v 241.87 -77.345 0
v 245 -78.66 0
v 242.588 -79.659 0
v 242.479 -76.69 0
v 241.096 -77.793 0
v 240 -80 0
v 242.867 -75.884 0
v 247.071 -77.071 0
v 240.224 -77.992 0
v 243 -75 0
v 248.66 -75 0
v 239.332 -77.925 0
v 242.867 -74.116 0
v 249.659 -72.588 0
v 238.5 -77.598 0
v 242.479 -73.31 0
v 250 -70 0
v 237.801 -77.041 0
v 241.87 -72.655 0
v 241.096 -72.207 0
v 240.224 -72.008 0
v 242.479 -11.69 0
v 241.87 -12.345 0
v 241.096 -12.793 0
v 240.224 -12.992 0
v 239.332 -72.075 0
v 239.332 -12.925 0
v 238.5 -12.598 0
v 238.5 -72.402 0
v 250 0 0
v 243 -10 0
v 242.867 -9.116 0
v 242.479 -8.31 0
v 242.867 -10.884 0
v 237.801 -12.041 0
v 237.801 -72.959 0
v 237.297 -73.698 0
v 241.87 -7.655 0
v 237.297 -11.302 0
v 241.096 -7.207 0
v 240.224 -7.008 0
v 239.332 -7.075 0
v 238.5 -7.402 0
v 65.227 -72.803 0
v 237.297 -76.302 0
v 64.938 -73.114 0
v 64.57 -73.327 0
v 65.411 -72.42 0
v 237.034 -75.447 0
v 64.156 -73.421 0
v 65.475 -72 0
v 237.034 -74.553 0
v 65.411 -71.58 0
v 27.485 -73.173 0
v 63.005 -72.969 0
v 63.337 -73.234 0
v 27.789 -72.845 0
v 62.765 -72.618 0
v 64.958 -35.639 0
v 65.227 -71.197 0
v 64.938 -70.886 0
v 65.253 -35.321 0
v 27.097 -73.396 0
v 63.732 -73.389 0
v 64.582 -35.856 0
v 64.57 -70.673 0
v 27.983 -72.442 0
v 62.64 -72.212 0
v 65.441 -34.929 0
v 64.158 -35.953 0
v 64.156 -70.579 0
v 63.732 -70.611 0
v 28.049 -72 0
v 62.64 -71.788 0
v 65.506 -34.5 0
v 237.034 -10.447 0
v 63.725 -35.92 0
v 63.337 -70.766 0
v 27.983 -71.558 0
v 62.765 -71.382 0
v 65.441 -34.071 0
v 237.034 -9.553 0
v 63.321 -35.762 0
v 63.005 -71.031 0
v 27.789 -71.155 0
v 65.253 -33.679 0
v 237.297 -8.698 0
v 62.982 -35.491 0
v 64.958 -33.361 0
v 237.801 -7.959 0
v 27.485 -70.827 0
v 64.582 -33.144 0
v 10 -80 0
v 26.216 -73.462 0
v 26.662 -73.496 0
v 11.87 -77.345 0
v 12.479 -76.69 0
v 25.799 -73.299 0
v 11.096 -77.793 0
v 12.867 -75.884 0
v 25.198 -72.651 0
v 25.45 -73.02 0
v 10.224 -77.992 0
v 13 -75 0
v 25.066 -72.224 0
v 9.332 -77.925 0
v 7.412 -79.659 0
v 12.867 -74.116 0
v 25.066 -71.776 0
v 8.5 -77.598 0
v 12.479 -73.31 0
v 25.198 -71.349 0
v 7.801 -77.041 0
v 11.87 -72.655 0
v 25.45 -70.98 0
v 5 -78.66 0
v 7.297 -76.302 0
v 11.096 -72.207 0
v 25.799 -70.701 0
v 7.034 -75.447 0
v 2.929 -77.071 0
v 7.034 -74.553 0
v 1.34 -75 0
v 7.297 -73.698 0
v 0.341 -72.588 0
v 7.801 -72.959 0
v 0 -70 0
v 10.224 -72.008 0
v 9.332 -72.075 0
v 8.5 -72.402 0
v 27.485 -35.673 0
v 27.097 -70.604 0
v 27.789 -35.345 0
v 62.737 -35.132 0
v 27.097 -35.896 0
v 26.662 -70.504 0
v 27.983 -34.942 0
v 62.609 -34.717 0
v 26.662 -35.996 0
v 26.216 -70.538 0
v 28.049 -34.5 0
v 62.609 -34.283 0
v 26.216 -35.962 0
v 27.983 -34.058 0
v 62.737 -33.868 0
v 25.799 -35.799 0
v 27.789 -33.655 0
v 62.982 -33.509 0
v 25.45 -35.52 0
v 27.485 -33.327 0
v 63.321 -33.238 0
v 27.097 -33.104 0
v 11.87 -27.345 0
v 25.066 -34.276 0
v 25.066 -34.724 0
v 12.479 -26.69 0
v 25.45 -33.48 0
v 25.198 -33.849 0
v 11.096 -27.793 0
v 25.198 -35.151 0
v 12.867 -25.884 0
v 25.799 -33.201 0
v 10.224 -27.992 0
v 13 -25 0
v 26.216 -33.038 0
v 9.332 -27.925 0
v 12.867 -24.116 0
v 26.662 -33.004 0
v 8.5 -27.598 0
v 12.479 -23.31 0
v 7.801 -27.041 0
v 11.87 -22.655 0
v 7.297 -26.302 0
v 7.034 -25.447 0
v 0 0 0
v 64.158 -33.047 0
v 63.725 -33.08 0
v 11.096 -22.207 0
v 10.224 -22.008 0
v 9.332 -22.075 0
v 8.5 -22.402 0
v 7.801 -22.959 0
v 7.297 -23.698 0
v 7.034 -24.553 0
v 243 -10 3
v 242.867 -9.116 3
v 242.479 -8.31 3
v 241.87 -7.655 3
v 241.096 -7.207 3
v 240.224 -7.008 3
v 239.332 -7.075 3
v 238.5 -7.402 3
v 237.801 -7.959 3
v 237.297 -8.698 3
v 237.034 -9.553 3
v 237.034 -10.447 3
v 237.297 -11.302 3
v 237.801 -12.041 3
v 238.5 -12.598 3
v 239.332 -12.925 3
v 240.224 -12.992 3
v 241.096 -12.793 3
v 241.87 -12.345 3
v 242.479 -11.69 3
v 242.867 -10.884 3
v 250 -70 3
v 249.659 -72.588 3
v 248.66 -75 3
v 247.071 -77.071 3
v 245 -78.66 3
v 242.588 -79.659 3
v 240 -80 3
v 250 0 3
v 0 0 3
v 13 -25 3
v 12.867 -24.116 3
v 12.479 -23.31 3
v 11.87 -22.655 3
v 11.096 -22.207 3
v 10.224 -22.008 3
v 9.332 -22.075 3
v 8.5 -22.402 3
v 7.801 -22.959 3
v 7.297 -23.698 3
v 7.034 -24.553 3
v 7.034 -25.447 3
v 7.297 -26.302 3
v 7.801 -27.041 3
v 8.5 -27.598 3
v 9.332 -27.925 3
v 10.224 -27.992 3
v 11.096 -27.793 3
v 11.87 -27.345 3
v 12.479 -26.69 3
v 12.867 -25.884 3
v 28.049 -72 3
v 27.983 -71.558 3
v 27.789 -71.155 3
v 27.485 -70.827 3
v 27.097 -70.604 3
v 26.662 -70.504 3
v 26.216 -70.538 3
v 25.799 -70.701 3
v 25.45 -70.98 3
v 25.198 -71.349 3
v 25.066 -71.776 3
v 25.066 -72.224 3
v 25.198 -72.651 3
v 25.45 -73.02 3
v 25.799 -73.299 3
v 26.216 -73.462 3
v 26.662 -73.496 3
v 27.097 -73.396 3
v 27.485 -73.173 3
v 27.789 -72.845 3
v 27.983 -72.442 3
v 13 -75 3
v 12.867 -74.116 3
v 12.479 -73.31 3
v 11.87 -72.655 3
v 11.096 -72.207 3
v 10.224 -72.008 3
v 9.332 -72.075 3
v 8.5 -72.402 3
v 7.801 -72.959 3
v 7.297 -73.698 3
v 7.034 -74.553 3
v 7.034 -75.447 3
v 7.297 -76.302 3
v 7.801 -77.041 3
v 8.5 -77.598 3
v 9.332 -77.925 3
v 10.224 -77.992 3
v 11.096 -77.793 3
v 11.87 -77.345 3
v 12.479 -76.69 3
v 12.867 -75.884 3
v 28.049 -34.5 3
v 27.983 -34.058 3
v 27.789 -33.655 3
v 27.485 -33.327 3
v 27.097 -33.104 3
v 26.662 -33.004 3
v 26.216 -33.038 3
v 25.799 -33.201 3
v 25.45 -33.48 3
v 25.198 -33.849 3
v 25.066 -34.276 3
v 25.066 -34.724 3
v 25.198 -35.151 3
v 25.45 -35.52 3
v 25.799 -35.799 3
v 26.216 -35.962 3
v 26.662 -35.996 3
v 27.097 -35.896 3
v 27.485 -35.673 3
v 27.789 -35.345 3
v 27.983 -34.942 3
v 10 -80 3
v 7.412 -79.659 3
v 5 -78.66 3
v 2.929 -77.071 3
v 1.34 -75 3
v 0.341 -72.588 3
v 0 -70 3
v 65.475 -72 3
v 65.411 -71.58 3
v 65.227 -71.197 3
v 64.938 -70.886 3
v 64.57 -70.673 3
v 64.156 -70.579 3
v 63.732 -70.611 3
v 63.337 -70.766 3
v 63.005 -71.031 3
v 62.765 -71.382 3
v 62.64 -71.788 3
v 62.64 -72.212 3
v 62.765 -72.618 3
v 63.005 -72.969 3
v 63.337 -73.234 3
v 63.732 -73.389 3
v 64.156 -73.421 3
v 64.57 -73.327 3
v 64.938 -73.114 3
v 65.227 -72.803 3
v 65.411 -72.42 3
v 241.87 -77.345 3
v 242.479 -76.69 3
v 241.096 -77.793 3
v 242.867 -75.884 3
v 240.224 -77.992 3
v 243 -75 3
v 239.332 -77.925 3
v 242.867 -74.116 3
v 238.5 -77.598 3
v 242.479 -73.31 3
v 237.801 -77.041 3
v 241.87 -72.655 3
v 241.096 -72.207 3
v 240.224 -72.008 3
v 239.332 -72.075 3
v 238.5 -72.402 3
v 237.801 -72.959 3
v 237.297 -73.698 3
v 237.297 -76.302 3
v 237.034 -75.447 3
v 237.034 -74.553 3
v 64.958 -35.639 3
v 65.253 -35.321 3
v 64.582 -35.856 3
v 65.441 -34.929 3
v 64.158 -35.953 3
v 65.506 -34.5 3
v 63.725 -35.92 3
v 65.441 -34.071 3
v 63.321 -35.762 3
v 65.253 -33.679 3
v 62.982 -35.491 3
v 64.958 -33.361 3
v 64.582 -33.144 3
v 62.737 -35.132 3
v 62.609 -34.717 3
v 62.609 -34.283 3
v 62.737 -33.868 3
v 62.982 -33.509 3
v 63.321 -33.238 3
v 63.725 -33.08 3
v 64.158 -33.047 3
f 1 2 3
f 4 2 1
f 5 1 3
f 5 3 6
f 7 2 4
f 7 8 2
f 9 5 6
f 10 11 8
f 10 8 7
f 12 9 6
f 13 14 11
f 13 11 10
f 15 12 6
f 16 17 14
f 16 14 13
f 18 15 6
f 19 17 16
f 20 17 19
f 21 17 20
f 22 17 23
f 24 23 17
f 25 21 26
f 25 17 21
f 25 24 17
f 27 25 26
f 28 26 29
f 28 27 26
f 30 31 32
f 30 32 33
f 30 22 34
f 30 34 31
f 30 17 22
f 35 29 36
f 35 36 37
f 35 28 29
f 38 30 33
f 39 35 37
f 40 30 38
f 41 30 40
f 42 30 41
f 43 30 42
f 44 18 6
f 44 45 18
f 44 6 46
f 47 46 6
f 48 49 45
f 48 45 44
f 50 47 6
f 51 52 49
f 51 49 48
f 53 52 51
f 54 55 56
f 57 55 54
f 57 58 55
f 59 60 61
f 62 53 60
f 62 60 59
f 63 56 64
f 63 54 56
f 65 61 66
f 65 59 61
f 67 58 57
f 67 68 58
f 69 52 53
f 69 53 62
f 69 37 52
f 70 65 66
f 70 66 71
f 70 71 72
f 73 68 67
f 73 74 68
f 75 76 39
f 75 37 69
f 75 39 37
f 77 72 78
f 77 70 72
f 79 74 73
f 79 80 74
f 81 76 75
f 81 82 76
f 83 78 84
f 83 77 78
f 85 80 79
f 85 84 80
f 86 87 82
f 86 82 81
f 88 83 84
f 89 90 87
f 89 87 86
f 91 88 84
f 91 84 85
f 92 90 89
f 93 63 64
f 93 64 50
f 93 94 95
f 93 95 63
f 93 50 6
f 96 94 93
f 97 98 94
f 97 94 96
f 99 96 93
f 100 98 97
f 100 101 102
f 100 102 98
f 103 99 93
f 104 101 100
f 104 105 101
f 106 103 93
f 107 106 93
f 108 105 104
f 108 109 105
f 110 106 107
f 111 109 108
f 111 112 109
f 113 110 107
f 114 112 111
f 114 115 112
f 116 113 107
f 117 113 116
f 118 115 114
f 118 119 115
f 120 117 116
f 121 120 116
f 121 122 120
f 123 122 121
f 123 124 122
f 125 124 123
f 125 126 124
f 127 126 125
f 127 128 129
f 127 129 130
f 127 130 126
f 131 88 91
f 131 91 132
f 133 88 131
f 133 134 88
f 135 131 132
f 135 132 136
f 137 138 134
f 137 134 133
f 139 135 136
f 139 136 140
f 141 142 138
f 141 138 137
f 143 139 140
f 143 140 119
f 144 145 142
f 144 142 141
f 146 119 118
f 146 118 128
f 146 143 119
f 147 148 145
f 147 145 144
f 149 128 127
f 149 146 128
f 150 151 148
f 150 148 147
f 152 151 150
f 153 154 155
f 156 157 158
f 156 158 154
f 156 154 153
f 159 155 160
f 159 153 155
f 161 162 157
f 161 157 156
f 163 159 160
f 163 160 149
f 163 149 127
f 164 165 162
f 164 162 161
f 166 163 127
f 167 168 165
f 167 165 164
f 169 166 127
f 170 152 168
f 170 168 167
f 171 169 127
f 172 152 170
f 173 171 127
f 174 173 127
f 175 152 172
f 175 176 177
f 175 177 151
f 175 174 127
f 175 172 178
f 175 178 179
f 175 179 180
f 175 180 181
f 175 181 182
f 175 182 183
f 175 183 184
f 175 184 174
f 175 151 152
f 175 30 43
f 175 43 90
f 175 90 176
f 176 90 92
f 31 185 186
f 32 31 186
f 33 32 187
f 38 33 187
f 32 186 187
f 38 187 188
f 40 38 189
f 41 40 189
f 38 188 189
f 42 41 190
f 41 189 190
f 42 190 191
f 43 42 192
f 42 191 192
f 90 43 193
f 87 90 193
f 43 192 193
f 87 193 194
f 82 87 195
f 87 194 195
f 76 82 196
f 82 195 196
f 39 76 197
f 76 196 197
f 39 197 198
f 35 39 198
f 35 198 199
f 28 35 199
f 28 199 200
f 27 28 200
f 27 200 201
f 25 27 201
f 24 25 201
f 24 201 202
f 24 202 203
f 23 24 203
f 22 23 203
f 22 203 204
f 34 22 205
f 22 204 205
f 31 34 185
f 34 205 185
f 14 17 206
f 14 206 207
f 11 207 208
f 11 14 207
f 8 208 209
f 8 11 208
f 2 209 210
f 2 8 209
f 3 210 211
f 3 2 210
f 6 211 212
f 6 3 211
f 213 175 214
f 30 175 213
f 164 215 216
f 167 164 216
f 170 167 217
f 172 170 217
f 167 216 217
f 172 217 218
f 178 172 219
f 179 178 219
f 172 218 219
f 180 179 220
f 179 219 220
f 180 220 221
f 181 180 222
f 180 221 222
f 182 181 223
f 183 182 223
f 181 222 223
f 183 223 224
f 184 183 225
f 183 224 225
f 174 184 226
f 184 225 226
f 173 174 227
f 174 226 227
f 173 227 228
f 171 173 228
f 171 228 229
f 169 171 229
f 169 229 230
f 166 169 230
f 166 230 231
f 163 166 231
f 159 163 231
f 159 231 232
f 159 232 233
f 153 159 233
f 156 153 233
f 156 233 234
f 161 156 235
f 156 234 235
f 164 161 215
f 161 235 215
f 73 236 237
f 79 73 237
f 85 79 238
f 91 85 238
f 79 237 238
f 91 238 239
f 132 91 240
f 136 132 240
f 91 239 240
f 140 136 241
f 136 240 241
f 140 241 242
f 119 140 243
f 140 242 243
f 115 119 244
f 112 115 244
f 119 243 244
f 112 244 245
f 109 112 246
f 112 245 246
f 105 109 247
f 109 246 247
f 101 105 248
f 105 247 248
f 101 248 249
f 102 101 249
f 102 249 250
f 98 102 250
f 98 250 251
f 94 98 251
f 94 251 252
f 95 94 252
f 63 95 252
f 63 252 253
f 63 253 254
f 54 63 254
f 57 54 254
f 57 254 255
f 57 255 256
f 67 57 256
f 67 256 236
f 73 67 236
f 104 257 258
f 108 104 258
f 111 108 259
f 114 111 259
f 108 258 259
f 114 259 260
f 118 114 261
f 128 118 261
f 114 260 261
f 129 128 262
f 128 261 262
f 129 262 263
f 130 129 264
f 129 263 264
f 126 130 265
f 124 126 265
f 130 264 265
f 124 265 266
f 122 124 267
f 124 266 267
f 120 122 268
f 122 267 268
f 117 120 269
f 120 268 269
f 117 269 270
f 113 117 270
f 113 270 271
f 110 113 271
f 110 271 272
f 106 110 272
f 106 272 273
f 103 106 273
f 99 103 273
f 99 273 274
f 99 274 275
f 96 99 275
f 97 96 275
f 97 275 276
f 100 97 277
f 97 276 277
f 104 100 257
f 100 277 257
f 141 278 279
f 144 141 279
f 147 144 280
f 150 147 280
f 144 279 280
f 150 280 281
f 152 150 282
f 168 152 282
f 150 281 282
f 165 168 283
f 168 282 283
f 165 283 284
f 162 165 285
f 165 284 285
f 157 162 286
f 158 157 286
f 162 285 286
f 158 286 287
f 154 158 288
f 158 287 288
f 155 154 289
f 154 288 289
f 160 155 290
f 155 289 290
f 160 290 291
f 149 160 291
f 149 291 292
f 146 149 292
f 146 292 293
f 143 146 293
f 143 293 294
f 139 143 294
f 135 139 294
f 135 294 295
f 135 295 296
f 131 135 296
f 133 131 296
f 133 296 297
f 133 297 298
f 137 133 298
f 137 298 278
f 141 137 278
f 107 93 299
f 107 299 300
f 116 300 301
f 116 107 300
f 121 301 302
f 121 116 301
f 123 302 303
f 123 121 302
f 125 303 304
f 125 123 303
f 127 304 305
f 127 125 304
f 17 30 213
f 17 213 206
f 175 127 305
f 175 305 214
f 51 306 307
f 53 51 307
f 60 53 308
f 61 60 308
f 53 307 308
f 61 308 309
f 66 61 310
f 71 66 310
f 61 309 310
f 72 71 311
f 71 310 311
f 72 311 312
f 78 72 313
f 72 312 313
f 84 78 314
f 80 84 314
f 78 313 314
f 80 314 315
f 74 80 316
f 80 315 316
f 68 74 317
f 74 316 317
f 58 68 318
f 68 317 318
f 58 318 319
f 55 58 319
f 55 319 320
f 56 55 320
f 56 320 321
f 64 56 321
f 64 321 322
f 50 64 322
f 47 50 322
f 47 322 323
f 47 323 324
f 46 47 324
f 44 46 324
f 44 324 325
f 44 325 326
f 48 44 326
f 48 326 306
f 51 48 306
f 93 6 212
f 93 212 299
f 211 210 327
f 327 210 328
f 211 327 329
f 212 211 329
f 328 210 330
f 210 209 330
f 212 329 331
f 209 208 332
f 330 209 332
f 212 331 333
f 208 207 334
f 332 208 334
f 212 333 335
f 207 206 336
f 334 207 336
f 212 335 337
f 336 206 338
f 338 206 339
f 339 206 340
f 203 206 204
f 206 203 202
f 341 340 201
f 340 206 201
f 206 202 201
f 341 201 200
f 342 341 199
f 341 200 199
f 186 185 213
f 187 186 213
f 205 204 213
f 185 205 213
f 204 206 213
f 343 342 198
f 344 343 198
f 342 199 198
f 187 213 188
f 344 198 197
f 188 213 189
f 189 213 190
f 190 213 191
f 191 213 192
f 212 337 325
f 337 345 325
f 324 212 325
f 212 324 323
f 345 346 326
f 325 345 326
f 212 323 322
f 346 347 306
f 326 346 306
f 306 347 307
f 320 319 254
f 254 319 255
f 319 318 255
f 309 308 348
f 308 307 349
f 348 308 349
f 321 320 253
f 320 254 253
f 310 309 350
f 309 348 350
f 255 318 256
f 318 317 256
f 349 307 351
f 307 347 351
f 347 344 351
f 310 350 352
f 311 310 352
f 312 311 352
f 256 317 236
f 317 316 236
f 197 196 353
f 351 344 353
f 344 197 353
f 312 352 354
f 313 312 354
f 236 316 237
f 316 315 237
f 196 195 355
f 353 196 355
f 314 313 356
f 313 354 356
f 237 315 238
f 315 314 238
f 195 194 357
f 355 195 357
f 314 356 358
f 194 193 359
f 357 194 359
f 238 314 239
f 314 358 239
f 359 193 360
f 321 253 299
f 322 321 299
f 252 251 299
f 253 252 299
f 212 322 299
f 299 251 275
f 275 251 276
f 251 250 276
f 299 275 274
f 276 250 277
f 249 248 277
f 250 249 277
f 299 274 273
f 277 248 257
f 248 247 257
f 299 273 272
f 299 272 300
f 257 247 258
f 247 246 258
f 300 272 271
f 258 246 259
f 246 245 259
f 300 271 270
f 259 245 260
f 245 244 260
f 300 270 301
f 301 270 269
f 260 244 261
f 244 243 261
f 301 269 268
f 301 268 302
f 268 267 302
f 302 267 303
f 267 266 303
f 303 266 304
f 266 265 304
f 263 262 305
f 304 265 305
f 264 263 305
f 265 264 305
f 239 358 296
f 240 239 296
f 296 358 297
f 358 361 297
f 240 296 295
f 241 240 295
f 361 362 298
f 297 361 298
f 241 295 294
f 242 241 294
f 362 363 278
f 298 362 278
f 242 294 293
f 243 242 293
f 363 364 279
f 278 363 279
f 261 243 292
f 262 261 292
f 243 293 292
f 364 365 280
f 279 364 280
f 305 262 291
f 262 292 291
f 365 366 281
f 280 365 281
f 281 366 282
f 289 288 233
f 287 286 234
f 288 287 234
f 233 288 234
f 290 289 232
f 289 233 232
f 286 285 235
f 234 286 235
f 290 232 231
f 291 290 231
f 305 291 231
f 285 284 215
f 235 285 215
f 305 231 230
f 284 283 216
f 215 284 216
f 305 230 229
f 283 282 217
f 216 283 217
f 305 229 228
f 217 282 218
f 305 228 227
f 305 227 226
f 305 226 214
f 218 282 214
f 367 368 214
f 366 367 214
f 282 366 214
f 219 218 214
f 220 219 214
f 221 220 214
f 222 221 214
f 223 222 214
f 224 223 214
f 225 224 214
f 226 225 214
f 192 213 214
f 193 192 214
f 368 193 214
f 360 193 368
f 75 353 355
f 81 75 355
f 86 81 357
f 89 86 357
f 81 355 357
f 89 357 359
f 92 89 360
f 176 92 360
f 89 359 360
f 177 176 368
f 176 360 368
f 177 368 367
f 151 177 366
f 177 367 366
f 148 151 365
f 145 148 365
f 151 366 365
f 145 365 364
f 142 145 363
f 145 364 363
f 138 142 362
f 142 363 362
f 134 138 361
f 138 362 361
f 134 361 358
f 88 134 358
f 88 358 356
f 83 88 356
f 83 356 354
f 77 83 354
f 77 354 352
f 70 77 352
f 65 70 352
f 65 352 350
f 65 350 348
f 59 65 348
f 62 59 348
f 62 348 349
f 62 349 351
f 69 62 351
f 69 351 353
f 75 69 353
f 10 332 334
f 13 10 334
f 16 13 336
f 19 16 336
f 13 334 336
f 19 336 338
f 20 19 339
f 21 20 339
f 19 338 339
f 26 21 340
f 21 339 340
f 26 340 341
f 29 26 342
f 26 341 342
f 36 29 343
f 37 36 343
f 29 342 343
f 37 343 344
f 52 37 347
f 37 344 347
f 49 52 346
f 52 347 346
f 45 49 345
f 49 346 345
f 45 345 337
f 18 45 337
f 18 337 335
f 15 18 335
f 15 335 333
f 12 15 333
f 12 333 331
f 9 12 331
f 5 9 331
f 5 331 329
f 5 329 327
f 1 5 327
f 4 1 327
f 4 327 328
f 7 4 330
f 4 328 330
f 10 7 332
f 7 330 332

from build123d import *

# Parameters (mm, degrees)
BOSS_EXTRU_1_DEPTH      = 3
ESQUISSE2_R             = 3
ENL_V_MAT_EXTRU_1_DEPTH = 3
ESQUISSE3_R             = 1.5
ESQUISSE3_R_2           = 1.456745064
ESQUISSE3_R_3           = 1.425181728
ENL_V_MAT_EXTRU_2_DEPTH = 10


with BuildPart() as part:
    # Esquisse1 → Boss.-Extru.1 (new body)
    with BuildSketch(Plane.XY):
        with BuildLine():
            Line((0, 0), (250, 0))
            Line((250, 0), (250, -70))
            ThreePointArc((250, -70), (247.071067812, -77.071067812), (240, -80))
            Line((240, -80), (10, -80))
            ThreePointArc((10, -80), (2.928932188, -77.071067812), (0, -70))
            Line((0, -70), (0, 0))
        make_face()
    extrude(amount=BOSS_EXTRU_1_DEPTH)

    # Esquisse2 → Enlèv. mat.-Extru.1 (cut)
    with BuildSketch(Plane.XY.offset(3)):
        with Locations((10, -75)):
            Circle(ESQUISSE2_R)
        with Locations((240, -75)):
            Circle(ESQUISSE2_R)
        with Locations((240, -10)):
            Circle(ESQUISSE2_R)
        with Locations((10, -25)):
            Circle(ESQUISSE2_R)
    extrude(amount=-ENL_V_MAT_EXTRU_1_DEPTH, mode=Mode.SUBTRACT)

    # Esquisse3 → Enlèv. mat.-Extru.2 (cut)
    with BuildSketch(Plane.XY.offset(3)):
        with Locations((26.549426967, -34.5)):
            Circle(ESQUISSE3_R)
        with Locations((64.049426967, -34.5)):
            Circle(ESQUISSE3_R_2)
        with Locations((64.049426967, -72)):
            Circle(ESQUISSE3_R_3)
        with Locations((26.549426967, -72)):
            Circle(ESQUISSE3_R)
    extrude(amount=-ENL_V_MAT_EXTRU_2_DEPTH, mode=Mode.SUBTRACT)


solid = part.part
